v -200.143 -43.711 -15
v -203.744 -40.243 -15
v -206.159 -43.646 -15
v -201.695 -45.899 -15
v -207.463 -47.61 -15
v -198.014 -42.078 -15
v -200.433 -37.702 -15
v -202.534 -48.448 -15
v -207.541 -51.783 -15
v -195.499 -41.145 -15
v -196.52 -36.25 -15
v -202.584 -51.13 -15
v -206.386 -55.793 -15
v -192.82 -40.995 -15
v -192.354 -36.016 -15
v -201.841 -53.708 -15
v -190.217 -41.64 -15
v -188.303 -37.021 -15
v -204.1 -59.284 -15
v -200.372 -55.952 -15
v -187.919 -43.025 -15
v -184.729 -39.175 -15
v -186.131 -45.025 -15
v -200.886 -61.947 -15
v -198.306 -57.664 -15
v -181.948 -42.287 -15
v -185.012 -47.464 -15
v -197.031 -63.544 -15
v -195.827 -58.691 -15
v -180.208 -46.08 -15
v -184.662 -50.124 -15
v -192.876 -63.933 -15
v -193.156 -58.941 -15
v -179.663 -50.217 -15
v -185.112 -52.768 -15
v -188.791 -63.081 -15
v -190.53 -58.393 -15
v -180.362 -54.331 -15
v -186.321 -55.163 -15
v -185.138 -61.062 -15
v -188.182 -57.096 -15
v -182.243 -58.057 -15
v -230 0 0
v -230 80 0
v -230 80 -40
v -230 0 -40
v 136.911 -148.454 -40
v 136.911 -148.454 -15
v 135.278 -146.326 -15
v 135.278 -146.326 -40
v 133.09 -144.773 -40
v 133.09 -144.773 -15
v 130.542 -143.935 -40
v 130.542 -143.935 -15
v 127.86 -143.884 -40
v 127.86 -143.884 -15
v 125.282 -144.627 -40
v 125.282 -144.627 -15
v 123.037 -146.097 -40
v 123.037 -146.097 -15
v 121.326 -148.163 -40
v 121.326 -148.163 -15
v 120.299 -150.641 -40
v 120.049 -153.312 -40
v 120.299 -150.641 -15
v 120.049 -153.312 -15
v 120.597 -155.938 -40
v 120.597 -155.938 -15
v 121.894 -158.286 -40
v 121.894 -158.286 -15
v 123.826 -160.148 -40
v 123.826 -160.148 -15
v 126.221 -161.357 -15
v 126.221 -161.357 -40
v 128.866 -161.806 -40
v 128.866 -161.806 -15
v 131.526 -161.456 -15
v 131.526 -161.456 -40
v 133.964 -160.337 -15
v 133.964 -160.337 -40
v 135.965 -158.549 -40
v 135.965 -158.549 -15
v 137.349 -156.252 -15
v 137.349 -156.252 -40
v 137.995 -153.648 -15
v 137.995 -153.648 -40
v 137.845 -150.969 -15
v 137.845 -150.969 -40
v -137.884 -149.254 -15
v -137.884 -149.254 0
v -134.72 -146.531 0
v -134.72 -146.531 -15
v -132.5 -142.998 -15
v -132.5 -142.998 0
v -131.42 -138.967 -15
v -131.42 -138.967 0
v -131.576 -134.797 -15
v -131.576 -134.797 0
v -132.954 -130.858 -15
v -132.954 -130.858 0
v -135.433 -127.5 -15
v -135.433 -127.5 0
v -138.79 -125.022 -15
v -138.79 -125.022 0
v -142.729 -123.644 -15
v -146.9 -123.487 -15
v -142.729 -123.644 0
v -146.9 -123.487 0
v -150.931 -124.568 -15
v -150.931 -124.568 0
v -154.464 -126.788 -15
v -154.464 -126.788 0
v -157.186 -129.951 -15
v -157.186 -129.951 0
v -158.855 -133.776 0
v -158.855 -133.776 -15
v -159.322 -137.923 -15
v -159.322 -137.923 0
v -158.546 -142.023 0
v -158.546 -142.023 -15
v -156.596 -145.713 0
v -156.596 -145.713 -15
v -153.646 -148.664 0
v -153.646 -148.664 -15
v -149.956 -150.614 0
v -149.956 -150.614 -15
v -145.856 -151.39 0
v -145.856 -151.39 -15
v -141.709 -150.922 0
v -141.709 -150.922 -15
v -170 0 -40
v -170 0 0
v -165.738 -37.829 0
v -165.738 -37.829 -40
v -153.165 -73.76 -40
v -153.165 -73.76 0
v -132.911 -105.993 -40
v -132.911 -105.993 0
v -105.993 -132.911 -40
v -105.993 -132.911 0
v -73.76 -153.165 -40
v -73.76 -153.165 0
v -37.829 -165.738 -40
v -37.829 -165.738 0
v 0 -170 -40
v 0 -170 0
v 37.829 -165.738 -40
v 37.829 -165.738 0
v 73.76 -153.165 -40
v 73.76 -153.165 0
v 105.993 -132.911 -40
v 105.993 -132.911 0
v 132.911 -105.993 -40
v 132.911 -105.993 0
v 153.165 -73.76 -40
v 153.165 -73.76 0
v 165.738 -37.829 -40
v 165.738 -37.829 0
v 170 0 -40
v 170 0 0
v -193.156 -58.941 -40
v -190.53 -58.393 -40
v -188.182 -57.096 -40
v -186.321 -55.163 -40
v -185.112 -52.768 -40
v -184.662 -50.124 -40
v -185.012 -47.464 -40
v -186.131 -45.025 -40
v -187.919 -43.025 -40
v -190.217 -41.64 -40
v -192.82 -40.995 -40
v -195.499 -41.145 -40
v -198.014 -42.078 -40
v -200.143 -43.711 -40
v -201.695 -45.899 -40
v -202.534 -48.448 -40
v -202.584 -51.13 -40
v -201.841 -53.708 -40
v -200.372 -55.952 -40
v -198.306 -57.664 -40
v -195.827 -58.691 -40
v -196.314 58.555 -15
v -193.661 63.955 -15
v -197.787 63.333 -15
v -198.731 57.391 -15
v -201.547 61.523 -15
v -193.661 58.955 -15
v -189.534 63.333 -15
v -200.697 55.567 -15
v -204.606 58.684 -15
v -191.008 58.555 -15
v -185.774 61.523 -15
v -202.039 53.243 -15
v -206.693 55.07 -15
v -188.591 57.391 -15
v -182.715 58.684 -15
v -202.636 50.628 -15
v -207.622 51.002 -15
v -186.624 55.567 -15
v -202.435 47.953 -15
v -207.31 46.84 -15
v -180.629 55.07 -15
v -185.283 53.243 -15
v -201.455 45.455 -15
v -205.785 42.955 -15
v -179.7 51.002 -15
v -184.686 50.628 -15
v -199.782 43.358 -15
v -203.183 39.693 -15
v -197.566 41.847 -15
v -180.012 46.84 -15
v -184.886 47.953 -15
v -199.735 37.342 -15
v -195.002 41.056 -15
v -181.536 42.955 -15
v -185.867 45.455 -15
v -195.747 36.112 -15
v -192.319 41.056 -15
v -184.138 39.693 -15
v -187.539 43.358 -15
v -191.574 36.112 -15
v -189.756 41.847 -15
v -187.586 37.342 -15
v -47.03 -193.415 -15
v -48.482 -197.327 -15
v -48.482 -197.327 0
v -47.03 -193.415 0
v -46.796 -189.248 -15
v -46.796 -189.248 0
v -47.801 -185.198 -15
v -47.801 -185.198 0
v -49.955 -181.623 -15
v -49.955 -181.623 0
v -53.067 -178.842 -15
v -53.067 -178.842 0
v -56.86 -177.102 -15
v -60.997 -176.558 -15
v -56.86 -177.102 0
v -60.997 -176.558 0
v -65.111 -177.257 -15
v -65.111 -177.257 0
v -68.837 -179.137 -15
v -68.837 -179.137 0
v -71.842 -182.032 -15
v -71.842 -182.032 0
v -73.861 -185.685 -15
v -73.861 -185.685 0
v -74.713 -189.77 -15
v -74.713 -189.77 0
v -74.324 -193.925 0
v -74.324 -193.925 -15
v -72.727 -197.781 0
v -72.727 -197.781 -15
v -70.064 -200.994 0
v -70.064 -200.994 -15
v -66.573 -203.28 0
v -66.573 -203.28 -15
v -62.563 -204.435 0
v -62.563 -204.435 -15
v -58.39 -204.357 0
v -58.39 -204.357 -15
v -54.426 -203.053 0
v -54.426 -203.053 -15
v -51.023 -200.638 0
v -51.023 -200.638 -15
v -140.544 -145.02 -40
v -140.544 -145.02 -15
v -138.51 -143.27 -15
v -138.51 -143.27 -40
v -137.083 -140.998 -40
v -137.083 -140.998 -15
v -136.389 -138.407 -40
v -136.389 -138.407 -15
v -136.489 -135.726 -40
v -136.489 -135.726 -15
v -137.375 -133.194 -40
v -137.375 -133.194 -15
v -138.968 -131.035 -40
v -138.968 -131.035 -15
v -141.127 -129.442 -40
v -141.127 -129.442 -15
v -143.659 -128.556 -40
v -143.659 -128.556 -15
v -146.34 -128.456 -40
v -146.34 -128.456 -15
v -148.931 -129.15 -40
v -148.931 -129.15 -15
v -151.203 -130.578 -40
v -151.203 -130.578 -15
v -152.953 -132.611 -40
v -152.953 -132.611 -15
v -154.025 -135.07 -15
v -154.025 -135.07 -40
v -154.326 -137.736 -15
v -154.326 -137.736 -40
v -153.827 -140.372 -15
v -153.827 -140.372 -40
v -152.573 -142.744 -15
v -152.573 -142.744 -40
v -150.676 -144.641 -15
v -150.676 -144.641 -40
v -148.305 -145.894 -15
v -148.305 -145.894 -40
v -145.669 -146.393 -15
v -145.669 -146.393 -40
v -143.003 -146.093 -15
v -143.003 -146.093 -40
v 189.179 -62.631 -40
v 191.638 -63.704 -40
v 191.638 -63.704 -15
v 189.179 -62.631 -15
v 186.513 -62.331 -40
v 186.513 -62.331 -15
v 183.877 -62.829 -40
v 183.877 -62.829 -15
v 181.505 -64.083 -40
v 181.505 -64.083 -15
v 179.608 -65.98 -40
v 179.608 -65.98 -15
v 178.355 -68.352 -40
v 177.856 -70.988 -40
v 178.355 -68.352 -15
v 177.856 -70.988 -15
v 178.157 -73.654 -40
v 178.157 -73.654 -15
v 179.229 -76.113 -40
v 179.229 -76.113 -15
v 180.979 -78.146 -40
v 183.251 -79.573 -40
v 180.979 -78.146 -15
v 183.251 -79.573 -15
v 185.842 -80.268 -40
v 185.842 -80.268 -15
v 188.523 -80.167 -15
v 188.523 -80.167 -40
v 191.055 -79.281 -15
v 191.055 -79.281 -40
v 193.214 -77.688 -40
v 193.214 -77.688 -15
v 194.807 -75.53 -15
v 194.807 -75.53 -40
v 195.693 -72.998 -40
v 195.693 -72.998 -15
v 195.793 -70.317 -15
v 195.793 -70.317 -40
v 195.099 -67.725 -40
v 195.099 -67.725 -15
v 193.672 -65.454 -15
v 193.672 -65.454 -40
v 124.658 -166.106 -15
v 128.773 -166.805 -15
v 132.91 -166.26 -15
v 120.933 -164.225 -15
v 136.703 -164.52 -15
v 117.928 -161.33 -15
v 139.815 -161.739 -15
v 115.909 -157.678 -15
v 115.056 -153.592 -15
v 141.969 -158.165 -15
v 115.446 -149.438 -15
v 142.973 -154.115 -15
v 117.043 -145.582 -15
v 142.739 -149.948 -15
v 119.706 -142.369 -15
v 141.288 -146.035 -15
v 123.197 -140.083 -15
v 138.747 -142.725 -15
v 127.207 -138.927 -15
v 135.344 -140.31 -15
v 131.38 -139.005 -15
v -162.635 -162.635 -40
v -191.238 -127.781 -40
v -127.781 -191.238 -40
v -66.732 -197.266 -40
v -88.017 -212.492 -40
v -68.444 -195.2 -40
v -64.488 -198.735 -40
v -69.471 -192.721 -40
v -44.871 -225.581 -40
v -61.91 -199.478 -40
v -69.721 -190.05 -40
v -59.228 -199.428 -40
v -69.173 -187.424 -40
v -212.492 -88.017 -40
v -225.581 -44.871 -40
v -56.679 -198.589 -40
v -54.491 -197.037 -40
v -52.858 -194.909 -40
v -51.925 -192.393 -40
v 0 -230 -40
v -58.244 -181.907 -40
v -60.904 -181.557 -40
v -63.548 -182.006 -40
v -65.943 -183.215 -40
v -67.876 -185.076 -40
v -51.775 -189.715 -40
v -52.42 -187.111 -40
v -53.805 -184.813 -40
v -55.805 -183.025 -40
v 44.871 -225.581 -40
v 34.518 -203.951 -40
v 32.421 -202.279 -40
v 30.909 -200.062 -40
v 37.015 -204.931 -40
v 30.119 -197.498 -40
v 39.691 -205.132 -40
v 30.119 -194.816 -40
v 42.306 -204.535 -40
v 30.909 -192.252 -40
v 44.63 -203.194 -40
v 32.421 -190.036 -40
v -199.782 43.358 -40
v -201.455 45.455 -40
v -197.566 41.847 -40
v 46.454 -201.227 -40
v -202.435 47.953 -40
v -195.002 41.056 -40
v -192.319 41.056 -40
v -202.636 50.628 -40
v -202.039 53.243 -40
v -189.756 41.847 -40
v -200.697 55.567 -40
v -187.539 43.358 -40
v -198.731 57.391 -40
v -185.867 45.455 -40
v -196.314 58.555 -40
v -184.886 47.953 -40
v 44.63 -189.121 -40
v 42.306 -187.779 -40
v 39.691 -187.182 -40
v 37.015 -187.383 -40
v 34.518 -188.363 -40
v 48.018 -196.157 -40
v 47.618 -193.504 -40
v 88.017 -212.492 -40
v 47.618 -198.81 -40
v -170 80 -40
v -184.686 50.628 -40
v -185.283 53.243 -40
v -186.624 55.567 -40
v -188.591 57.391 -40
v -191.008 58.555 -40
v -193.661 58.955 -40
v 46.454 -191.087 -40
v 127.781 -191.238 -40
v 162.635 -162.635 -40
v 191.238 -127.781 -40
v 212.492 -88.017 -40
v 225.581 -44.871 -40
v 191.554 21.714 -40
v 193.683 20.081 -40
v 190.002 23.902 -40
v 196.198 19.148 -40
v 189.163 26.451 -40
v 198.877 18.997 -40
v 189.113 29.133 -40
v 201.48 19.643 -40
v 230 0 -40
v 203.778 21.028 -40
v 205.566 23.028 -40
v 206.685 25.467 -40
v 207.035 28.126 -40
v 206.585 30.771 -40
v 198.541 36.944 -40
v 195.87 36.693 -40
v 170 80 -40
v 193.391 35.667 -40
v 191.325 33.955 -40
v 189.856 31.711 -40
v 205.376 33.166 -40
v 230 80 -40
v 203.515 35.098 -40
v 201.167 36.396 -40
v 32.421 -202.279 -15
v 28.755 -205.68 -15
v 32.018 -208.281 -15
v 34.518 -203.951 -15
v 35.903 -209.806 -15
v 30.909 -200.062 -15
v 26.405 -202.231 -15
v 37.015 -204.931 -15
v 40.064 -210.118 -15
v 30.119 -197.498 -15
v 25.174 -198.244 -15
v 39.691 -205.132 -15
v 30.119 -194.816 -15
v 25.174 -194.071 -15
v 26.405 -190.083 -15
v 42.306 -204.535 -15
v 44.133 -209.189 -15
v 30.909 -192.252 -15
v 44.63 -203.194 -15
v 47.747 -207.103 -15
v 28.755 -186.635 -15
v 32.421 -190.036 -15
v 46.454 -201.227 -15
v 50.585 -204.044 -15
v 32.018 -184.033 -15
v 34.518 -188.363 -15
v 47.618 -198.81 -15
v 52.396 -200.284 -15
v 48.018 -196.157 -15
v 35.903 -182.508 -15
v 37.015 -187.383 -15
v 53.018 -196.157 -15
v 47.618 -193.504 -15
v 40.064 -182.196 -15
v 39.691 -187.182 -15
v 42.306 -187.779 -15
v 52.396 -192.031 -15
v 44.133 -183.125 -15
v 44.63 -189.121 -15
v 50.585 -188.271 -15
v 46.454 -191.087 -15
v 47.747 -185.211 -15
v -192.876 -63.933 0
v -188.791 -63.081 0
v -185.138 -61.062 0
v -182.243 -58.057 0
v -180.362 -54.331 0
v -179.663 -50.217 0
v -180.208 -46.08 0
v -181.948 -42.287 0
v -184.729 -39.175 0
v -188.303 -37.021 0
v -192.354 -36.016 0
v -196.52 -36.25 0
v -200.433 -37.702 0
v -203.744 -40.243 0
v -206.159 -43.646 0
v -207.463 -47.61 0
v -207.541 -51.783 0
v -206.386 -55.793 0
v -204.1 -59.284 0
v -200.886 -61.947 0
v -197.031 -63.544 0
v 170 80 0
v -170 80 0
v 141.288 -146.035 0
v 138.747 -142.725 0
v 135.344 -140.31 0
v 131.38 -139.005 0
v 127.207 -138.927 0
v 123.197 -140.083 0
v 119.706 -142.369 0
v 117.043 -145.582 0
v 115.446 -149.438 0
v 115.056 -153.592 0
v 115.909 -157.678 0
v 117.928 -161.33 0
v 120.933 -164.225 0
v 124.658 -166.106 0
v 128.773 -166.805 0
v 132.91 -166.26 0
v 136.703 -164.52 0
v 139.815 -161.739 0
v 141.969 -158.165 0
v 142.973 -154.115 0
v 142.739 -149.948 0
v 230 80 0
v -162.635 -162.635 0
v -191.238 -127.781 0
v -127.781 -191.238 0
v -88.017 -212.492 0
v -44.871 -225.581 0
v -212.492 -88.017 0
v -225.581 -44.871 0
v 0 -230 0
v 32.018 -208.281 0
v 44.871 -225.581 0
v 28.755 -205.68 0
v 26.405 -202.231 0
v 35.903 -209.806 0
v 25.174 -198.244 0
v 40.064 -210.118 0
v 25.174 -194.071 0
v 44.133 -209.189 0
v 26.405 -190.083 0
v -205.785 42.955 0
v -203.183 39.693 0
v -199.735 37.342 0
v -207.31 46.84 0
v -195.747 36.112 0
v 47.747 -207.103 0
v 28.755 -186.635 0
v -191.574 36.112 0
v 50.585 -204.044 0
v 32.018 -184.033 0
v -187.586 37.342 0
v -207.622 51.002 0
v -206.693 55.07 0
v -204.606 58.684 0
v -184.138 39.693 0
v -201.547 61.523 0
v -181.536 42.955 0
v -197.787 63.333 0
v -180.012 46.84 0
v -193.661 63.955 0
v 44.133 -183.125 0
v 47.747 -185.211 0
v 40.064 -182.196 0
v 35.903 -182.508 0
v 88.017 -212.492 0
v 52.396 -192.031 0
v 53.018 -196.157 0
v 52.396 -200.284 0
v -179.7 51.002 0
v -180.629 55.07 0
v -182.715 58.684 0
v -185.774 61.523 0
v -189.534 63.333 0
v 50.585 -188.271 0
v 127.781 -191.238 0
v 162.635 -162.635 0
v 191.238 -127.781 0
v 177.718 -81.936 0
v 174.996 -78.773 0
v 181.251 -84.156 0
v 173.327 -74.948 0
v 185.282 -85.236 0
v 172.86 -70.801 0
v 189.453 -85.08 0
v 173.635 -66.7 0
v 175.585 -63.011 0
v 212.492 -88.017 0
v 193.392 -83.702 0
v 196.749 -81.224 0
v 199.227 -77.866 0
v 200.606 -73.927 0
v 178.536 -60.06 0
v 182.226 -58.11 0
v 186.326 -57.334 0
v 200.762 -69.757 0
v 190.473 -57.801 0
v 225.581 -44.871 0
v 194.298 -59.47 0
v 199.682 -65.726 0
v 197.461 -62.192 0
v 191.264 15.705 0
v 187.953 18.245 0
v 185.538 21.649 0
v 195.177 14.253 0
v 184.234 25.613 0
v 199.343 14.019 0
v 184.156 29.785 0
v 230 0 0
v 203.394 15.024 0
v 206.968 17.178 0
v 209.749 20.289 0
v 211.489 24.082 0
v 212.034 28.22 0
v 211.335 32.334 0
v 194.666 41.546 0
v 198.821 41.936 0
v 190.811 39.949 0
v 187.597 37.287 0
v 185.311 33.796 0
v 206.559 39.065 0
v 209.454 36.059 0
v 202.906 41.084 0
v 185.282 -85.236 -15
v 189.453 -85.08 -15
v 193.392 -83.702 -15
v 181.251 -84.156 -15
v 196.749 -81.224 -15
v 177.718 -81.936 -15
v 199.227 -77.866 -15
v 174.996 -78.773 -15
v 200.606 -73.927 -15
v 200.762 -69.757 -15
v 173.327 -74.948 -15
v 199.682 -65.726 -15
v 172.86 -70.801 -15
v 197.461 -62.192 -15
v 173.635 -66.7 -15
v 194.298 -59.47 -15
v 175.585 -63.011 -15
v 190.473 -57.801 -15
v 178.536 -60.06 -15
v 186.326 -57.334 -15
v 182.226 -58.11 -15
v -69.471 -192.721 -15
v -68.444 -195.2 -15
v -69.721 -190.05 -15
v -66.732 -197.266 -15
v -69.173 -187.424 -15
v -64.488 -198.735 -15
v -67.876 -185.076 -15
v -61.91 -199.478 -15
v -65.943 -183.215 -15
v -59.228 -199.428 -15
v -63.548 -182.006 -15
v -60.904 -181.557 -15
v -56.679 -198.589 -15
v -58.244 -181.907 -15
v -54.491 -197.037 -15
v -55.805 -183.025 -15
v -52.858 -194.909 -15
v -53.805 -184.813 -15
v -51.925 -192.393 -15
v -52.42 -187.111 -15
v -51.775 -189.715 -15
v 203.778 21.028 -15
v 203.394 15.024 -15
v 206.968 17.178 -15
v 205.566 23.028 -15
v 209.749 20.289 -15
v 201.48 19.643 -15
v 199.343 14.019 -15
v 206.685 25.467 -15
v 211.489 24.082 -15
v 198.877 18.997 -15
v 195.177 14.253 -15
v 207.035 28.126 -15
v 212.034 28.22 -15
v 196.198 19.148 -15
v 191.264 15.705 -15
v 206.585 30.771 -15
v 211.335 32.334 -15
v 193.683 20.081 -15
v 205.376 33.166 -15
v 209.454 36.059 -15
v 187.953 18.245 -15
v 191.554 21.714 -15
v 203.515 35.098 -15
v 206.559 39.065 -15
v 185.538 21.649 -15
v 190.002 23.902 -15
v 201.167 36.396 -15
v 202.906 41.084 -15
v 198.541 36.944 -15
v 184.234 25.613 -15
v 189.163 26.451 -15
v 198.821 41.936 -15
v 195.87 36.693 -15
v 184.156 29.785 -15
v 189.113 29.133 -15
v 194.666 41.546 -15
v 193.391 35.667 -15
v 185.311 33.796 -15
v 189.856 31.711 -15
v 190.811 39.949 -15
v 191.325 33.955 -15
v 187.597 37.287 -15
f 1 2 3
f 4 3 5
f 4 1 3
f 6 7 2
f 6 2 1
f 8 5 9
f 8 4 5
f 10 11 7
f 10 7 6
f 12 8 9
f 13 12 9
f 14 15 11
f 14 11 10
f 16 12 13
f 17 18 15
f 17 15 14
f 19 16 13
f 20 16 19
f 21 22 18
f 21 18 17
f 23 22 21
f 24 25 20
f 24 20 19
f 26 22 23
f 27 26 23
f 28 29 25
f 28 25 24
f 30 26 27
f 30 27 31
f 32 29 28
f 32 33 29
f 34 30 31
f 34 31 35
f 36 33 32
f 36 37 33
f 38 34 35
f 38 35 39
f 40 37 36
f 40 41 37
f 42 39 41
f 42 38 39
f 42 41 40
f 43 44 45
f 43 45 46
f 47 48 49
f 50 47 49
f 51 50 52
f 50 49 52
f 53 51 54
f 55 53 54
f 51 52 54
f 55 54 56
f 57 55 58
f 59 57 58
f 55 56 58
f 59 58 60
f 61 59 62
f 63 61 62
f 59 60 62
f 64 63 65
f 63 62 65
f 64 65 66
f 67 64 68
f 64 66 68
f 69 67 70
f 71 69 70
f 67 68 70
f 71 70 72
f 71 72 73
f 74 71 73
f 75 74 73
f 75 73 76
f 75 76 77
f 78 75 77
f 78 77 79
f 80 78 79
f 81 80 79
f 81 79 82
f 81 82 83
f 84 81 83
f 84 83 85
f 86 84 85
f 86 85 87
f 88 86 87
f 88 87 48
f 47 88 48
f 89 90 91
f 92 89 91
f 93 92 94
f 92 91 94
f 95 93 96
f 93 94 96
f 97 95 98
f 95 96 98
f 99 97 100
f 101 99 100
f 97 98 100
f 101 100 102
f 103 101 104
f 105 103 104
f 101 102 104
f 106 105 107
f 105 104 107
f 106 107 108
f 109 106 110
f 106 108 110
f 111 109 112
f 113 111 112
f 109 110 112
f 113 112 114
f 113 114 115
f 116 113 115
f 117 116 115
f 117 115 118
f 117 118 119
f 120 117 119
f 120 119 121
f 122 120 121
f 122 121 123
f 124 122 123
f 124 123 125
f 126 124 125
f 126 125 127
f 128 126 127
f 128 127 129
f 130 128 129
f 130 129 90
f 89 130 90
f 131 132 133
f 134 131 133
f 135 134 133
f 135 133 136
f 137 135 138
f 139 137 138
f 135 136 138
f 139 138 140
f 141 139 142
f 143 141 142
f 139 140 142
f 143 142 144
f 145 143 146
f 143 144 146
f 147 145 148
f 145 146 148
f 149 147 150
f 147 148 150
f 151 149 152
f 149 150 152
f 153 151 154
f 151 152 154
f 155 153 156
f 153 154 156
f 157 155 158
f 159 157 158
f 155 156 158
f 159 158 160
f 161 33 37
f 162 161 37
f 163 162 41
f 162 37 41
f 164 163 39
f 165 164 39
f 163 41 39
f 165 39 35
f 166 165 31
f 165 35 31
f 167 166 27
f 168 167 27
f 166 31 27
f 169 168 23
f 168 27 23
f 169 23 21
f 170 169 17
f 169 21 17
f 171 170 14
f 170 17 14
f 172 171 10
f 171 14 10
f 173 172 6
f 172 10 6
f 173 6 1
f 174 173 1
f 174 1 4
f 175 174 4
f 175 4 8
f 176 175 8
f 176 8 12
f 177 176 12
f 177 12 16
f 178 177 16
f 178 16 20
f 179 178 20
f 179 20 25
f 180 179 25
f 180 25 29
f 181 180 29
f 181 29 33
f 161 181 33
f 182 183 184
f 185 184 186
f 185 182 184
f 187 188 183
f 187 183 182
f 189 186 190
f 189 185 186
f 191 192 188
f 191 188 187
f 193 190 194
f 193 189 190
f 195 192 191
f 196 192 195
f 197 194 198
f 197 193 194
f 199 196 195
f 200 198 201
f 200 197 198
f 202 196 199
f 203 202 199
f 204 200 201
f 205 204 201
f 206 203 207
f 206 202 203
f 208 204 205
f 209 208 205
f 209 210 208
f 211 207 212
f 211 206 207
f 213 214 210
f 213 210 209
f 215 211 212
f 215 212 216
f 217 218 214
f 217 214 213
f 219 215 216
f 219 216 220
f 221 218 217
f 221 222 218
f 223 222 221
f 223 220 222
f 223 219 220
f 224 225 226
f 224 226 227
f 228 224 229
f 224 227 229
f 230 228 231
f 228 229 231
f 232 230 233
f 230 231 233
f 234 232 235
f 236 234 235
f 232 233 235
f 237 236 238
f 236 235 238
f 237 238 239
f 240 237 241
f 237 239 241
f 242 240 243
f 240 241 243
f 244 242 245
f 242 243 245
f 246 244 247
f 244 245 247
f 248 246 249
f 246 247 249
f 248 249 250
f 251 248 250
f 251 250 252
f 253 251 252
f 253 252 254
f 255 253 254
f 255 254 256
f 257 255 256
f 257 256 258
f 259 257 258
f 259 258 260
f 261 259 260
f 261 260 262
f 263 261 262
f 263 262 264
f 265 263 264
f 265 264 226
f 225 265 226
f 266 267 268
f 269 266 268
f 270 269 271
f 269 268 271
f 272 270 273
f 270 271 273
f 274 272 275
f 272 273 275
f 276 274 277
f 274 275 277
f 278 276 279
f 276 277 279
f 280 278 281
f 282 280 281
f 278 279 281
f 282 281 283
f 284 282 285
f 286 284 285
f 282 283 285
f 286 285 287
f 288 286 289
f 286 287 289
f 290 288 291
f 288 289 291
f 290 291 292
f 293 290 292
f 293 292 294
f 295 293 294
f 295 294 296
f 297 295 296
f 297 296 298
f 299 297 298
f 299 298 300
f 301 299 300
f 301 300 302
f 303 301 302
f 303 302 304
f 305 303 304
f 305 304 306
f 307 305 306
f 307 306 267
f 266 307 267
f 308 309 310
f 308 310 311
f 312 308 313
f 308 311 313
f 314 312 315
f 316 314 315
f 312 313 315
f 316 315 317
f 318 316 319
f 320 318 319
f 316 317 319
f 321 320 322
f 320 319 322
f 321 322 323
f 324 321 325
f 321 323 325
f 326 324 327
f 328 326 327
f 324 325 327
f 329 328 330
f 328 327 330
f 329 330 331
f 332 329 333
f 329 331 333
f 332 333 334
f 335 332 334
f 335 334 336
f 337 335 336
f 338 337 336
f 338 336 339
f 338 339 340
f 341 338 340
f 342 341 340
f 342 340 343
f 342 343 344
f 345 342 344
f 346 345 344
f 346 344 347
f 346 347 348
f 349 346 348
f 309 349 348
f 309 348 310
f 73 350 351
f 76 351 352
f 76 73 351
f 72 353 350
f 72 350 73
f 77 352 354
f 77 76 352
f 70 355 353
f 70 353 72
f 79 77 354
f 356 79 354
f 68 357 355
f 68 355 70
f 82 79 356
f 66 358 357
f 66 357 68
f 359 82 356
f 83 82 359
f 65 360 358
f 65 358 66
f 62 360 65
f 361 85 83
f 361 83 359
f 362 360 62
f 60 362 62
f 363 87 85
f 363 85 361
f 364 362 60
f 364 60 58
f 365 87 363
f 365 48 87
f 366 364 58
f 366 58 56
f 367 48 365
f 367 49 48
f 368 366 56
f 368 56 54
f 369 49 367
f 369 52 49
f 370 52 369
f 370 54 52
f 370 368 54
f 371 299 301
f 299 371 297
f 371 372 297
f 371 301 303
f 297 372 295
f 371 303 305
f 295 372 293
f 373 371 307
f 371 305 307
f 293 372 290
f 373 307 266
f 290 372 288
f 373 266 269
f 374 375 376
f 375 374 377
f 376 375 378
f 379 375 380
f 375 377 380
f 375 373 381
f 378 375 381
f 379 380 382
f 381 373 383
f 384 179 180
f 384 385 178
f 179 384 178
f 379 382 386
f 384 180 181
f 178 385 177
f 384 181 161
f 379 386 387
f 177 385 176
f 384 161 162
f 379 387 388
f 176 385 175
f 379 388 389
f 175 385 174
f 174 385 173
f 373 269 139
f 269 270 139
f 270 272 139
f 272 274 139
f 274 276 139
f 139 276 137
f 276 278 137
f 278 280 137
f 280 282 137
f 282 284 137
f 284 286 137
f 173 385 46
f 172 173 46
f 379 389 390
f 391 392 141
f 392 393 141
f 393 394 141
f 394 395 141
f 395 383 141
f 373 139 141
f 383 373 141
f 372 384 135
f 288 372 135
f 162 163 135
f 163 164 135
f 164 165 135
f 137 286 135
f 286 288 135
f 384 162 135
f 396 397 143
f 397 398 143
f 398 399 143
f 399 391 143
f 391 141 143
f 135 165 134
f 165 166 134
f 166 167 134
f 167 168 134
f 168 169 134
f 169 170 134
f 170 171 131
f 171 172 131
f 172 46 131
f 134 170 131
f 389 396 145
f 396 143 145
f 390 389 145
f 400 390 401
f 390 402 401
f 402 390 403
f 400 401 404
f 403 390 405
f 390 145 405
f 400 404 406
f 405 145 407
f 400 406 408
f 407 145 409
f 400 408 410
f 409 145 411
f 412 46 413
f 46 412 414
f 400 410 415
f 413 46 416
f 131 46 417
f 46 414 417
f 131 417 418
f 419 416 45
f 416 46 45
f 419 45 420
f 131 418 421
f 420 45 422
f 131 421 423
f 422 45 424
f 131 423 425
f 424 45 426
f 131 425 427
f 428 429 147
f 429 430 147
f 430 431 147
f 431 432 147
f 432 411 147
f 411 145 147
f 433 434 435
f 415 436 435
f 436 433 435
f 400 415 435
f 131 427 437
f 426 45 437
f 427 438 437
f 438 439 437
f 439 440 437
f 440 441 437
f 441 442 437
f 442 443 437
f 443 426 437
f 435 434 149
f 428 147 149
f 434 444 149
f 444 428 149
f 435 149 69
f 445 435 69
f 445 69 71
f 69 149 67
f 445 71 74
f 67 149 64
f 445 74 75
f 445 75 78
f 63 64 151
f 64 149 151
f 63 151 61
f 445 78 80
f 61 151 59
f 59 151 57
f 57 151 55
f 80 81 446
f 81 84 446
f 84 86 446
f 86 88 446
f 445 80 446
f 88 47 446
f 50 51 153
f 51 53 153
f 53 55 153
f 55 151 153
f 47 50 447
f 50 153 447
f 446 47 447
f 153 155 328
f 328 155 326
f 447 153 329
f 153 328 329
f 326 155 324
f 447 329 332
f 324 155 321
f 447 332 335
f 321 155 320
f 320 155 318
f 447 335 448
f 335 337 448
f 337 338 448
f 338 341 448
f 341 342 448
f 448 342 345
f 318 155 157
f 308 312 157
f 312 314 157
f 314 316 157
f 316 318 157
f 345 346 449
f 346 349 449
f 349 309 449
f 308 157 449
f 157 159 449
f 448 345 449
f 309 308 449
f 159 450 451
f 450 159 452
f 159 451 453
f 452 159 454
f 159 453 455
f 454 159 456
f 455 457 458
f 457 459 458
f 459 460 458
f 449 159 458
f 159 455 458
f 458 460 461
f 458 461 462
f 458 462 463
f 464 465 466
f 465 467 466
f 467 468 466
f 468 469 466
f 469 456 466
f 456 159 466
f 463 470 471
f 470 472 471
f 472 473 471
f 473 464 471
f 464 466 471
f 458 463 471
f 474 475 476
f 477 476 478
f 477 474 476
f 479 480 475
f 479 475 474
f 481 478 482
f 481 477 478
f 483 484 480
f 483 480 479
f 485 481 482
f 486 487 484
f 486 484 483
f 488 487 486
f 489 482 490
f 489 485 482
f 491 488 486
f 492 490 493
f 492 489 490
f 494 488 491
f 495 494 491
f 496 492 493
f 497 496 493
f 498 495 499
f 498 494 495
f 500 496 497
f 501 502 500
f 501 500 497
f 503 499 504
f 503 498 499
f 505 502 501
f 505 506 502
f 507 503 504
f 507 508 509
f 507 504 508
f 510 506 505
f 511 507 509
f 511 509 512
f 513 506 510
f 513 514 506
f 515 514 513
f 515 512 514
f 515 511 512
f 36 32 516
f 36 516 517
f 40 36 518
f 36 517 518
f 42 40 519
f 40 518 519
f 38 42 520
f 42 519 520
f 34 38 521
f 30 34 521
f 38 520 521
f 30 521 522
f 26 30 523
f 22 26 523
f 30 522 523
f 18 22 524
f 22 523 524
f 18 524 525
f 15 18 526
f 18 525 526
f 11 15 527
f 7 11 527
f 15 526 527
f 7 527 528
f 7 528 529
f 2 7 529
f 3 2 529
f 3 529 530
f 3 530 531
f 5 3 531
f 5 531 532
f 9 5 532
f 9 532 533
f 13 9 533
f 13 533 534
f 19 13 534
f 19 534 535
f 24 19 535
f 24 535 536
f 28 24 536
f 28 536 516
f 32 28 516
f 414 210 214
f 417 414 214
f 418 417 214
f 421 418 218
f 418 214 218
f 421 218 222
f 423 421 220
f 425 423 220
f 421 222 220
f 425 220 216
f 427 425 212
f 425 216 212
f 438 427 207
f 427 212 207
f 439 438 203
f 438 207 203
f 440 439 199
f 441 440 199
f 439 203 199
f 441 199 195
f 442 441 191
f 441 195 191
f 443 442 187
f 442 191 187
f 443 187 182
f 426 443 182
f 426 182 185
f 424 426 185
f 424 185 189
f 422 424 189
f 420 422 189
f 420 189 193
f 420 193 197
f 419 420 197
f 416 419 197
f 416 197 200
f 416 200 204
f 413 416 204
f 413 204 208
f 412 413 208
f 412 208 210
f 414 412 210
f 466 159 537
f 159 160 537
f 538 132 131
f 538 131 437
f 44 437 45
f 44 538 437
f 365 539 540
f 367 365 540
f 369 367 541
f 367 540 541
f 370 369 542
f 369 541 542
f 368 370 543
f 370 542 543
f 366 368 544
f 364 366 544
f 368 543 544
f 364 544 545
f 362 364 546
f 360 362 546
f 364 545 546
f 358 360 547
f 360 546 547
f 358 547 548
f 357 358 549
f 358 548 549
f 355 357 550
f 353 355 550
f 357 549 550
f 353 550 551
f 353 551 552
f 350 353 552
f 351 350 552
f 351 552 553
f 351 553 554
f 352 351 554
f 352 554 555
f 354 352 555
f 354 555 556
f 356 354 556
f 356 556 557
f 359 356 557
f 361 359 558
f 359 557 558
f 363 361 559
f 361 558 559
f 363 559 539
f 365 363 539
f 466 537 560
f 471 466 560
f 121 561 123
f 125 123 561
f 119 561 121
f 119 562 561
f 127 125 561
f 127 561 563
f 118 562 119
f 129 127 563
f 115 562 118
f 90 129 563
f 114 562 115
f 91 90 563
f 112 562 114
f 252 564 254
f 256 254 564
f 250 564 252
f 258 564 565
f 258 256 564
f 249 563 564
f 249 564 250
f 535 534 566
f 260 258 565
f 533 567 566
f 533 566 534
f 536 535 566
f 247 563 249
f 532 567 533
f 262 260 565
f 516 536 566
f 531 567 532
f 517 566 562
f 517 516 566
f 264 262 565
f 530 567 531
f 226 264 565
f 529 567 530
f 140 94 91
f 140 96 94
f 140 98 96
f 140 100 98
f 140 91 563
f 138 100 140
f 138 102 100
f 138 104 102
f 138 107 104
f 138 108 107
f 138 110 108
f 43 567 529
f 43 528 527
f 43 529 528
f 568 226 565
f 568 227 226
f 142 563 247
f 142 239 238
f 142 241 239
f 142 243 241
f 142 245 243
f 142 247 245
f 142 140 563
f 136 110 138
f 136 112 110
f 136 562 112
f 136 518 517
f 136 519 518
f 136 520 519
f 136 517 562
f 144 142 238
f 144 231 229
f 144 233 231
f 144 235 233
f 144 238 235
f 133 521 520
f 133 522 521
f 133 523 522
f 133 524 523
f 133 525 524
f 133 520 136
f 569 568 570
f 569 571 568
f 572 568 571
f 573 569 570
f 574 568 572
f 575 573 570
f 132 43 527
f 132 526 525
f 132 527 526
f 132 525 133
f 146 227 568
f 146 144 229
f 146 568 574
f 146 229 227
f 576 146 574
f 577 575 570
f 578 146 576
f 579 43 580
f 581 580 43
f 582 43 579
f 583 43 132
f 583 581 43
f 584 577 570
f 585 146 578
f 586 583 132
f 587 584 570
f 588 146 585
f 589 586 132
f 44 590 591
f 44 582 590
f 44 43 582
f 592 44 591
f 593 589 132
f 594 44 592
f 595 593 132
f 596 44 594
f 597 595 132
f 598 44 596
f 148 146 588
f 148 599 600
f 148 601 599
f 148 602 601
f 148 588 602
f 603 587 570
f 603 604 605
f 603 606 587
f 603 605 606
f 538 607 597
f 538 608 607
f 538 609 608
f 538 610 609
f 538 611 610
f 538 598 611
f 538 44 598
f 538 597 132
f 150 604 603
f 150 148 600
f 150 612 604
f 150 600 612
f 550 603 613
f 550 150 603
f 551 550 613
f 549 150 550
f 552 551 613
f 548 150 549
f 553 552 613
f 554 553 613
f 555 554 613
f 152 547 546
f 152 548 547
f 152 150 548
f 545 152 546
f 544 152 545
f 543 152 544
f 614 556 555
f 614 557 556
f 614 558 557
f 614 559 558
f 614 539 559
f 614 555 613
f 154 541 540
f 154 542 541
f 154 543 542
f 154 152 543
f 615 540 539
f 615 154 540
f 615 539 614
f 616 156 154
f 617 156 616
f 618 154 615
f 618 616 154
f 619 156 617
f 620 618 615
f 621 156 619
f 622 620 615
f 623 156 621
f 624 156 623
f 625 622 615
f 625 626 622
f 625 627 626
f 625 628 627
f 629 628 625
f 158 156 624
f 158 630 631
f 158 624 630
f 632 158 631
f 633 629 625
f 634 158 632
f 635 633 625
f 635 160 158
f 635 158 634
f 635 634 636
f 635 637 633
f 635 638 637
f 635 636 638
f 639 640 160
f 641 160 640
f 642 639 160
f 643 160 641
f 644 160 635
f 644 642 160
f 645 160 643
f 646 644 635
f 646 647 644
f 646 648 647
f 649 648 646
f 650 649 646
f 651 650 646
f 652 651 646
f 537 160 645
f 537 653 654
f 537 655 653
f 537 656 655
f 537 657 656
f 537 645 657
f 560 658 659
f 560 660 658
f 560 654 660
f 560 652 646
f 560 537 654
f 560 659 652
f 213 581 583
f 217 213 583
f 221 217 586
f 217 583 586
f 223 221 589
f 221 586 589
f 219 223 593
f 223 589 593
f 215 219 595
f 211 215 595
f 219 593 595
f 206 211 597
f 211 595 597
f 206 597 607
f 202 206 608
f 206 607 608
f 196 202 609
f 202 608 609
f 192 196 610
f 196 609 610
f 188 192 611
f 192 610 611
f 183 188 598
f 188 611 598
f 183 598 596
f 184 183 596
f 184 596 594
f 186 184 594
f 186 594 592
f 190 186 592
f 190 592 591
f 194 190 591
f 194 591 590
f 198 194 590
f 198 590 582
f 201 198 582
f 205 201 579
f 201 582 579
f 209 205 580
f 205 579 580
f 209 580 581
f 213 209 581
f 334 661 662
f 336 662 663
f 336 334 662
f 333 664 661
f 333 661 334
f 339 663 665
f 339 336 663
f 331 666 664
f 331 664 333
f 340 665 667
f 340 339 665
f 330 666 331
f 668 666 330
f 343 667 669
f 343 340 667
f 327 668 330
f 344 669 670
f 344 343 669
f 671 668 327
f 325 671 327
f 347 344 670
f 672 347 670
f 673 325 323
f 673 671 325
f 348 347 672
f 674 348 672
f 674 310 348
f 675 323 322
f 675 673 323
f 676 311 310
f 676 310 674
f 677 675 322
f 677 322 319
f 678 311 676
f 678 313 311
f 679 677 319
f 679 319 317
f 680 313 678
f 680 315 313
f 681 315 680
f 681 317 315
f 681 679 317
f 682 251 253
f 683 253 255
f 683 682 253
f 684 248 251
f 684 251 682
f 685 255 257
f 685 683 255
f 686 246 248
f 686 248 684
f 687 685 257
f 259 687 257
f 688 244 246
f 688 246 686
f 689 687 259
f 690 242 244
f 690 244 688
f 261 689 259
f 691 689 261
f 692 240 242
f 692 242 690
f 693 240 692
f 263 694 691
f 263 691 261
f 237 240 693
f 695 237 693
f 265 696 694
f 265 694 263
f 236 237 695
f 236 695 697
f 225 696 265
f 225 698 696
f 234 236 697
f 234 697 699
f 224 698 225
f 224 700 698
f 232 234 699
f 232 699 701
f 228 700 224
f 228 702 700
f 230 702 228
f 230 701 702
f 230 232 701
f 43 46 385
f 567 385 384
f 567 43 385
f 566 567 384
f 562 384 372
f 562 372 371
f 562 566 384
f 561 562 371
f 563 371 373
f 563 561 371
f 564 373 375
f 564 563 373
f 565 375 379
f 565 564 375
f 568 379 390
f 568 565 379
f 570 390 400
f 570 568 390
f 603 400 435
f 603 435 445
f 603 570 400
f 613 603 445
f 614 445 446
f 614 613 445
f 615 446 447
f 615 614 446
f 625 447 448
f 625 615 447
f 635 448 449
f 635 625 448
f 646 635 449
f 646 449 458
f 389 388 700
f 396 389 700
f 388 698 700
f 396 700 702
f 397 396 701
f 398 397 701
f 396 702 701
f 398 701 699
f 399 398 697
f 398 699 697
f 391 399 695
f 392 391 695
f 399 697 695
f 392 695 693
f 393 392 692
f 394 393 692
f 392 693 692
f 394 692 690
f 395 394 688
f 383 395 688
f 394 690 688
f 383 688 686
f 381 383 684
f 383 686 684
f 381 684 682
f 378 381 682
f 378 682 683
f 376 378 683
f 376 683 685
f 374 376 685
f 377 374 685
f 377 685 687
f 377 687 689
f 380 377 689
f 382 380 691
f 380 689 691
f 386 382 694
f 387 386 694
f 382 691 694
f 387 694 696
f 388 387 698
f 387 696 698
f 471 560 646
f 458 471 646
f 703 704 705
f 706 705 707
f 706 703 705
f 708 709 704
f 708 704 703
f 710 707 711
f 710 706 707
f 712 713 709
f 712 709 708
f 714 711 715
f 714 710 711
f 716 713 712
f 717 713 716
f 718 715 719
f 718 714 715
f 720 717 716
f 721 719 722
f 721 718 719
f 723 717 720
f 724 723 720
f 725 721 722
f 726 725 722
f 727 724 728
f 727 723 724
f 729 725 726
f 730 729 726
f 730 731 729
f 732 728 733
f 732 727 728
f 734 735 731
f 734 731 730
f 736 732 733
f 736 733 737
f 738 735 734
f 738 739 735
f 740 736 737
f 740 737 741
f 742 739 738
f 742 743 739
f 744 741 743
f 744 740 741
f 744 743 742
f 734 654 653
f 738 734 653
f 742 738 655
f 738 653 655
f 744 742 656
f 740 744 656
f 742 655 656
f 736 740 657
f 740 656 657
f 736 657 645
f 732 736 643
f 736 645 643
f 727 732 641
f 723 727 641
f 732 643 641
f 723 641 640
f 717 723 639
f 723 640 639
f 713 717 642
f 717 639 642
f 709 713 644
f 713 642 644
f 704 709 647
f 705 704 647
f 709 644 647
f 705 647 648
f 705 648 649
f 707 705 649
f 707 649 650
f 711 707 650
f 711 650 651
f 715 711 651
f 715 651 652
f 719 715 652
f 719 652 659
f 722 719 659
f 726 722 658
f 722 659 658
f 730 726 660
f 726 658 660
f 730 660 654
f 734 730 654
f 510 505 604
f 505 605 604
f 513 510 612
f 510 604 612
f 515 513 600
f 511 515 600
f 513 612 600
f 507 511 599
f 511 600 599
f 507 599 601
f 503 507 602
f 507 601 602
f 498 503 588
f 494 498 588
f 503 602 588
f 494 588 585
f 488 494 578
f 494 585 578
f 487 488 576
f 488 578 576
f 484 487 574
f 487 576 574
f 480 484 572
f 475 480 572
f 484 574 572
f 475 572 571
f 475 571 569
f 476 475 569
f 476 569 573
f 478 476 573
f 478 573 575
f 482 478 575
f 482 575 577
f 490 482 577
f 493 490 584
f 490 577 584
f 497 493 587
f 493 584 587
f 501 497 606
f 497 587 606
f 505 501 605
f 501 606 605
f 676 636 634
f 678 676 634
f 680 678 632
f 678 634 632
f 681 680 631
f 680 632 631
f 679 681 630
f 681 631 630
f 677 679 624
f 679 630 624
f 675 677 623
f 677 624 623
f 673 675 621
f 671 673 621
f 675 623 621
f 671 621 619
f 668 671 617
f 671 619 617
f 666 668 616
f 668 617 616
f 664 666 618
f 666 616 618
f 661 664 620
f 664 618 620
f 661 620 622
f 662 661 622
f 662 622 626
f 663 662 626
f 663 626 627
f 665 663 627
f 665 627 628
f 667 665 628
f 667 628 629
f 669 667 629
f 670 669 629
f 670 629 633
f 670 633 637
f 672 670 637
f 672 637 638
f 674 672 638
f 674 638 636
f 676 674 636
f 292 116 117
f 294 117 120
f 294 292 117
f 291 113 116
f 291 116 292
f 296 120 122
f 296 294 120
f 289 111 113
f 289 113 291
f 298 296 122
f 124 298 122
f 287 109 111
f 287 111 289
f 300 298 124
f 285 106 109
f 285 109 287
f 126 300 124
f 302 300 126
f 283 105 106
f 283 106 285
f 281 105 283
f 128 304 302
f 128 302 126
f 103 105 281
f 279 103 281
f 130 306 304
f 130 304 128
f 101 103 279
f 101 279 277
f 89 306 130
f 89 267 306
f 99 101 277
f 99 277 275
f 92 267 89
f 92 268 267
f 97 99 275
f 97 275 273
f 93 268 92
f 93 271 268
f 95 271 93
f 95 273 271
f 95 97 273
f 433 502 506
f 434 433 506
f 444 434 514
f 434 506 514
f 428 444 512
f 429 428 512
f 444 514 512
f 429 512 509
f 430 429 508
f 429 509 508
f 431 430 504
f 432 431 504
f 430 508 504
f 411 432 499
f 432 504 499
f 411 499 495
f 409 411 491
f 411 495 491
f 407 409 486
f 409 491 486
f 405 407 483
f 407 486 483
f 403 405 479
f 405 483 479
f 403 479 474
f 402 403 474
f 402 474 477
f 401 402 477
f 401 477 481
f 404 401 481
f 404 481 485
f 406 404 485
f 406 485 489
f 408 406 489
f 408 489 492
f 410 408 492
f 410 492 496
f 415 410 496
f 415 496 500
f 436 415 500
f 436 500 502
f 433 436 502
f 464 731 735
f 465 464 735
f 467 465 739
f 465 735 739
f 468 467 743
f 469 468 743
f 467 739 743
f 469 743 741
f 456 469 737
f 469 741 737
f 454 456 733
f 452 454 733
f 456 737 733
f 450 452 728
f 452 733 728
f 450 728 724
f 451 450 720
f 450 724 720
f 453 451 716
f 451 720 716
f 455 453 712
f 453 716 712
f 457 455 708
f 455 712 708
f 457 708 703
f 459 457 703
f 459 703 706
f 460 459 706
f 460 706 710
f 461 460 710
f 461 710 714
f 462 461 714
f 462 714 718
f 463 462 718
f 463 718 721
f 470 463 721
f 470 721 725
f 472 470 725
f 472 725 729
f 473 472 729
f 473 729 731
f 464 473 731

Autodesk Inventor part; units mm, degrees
ref_plane "YZ Plane" through (0, 0, 0) normal (1, 0, 0) x (0, 1, 0)
ref_plane "XZ Plane" through (0, 0, 0) normal (0, 1, 0) x (-1, 0, 0)
ref_plane "XY Plane" through (0, 0, 0) normal (0, 0, 1) x (1, 0, 0)
sketch "Sketch1" plane through (0, 0, 0) normal (0, 0, 1) x (1, 0, 0)
  circle A0 centre (0, 0) radius 200 construction
  line L0 (0, 200) -> (0, 230) construction
  line L1 (0, 200) -> (0, 170) construction
  circle A1 centre (0, 0) radius 170
  circle A2 centre (0, 0) radius 230
  line L2 (-170, 0) -> (-170, 80)
  line L3 (-170, 80) -> (-230, 80)
  line L4 (-230, 80) -> (-230, 0)
  line L5 (170, 0) -> (170, 80)
  line L6 (170, 80) -> (230, 80)
  line L7 (230, 80) -> (230, 0)
  dimension "d13" = 400
  dimension "d26" = 80
  dimension "d36" = 60
extrude "Extrusion1" add sketch "Sketch1" against normal blind 40 contours L5 L6 A2 L3 L2 A1 | L6 L7 A2 | A2 L4 L3 picked at (-188.7937, 40.2131)
sketch "Sketch4" plane through (0, 0, 0) normal (0, 0, 1) x (1, 0, 0)
  circle A0 centre (39.0181, -196.1571) radius 9
  line L0 (0, 0) -> (39.0181, -196.1571) construction
  line L1 (0, 0) -> (0, -276.8337) construction
  dimension "d17" = 18
  dimension "d27" = 200
  dimension "d35" = 11.25
extrude "Extrusion4" cut sketch "Sketch4" against normal through all
sketch "Sketch5" plane through (0, 0, 0) normal (0, 0, 1) x (1, 0, 0)
  circle A0 centre (39.0181, -196.1571) radius 9 projected
  circle A1 centre (39.0181, -196.1571) radius 14
  point P0 (0, 0)
  dimension "d23" = 28
extrude "Extrusion5" cut sketch "Sketch5" against normal blind 15
pattern_circular "Circular Pattern3" count 8 over 202.5 about axis through (0, 0, 0) along (0, 0, -1) of "Extrusion4", "Extrusion5" both ways yes
equation "\"d13\" = Шпил_пласт_НОС_диам_центров"
equation "\"d27\" = 0.5 * Шпил_пласт_НОС_диам_центров"
equation "\"Шпил_пласт_НОС_диам_центров\" = 400"
properties part number "Постель 200"
